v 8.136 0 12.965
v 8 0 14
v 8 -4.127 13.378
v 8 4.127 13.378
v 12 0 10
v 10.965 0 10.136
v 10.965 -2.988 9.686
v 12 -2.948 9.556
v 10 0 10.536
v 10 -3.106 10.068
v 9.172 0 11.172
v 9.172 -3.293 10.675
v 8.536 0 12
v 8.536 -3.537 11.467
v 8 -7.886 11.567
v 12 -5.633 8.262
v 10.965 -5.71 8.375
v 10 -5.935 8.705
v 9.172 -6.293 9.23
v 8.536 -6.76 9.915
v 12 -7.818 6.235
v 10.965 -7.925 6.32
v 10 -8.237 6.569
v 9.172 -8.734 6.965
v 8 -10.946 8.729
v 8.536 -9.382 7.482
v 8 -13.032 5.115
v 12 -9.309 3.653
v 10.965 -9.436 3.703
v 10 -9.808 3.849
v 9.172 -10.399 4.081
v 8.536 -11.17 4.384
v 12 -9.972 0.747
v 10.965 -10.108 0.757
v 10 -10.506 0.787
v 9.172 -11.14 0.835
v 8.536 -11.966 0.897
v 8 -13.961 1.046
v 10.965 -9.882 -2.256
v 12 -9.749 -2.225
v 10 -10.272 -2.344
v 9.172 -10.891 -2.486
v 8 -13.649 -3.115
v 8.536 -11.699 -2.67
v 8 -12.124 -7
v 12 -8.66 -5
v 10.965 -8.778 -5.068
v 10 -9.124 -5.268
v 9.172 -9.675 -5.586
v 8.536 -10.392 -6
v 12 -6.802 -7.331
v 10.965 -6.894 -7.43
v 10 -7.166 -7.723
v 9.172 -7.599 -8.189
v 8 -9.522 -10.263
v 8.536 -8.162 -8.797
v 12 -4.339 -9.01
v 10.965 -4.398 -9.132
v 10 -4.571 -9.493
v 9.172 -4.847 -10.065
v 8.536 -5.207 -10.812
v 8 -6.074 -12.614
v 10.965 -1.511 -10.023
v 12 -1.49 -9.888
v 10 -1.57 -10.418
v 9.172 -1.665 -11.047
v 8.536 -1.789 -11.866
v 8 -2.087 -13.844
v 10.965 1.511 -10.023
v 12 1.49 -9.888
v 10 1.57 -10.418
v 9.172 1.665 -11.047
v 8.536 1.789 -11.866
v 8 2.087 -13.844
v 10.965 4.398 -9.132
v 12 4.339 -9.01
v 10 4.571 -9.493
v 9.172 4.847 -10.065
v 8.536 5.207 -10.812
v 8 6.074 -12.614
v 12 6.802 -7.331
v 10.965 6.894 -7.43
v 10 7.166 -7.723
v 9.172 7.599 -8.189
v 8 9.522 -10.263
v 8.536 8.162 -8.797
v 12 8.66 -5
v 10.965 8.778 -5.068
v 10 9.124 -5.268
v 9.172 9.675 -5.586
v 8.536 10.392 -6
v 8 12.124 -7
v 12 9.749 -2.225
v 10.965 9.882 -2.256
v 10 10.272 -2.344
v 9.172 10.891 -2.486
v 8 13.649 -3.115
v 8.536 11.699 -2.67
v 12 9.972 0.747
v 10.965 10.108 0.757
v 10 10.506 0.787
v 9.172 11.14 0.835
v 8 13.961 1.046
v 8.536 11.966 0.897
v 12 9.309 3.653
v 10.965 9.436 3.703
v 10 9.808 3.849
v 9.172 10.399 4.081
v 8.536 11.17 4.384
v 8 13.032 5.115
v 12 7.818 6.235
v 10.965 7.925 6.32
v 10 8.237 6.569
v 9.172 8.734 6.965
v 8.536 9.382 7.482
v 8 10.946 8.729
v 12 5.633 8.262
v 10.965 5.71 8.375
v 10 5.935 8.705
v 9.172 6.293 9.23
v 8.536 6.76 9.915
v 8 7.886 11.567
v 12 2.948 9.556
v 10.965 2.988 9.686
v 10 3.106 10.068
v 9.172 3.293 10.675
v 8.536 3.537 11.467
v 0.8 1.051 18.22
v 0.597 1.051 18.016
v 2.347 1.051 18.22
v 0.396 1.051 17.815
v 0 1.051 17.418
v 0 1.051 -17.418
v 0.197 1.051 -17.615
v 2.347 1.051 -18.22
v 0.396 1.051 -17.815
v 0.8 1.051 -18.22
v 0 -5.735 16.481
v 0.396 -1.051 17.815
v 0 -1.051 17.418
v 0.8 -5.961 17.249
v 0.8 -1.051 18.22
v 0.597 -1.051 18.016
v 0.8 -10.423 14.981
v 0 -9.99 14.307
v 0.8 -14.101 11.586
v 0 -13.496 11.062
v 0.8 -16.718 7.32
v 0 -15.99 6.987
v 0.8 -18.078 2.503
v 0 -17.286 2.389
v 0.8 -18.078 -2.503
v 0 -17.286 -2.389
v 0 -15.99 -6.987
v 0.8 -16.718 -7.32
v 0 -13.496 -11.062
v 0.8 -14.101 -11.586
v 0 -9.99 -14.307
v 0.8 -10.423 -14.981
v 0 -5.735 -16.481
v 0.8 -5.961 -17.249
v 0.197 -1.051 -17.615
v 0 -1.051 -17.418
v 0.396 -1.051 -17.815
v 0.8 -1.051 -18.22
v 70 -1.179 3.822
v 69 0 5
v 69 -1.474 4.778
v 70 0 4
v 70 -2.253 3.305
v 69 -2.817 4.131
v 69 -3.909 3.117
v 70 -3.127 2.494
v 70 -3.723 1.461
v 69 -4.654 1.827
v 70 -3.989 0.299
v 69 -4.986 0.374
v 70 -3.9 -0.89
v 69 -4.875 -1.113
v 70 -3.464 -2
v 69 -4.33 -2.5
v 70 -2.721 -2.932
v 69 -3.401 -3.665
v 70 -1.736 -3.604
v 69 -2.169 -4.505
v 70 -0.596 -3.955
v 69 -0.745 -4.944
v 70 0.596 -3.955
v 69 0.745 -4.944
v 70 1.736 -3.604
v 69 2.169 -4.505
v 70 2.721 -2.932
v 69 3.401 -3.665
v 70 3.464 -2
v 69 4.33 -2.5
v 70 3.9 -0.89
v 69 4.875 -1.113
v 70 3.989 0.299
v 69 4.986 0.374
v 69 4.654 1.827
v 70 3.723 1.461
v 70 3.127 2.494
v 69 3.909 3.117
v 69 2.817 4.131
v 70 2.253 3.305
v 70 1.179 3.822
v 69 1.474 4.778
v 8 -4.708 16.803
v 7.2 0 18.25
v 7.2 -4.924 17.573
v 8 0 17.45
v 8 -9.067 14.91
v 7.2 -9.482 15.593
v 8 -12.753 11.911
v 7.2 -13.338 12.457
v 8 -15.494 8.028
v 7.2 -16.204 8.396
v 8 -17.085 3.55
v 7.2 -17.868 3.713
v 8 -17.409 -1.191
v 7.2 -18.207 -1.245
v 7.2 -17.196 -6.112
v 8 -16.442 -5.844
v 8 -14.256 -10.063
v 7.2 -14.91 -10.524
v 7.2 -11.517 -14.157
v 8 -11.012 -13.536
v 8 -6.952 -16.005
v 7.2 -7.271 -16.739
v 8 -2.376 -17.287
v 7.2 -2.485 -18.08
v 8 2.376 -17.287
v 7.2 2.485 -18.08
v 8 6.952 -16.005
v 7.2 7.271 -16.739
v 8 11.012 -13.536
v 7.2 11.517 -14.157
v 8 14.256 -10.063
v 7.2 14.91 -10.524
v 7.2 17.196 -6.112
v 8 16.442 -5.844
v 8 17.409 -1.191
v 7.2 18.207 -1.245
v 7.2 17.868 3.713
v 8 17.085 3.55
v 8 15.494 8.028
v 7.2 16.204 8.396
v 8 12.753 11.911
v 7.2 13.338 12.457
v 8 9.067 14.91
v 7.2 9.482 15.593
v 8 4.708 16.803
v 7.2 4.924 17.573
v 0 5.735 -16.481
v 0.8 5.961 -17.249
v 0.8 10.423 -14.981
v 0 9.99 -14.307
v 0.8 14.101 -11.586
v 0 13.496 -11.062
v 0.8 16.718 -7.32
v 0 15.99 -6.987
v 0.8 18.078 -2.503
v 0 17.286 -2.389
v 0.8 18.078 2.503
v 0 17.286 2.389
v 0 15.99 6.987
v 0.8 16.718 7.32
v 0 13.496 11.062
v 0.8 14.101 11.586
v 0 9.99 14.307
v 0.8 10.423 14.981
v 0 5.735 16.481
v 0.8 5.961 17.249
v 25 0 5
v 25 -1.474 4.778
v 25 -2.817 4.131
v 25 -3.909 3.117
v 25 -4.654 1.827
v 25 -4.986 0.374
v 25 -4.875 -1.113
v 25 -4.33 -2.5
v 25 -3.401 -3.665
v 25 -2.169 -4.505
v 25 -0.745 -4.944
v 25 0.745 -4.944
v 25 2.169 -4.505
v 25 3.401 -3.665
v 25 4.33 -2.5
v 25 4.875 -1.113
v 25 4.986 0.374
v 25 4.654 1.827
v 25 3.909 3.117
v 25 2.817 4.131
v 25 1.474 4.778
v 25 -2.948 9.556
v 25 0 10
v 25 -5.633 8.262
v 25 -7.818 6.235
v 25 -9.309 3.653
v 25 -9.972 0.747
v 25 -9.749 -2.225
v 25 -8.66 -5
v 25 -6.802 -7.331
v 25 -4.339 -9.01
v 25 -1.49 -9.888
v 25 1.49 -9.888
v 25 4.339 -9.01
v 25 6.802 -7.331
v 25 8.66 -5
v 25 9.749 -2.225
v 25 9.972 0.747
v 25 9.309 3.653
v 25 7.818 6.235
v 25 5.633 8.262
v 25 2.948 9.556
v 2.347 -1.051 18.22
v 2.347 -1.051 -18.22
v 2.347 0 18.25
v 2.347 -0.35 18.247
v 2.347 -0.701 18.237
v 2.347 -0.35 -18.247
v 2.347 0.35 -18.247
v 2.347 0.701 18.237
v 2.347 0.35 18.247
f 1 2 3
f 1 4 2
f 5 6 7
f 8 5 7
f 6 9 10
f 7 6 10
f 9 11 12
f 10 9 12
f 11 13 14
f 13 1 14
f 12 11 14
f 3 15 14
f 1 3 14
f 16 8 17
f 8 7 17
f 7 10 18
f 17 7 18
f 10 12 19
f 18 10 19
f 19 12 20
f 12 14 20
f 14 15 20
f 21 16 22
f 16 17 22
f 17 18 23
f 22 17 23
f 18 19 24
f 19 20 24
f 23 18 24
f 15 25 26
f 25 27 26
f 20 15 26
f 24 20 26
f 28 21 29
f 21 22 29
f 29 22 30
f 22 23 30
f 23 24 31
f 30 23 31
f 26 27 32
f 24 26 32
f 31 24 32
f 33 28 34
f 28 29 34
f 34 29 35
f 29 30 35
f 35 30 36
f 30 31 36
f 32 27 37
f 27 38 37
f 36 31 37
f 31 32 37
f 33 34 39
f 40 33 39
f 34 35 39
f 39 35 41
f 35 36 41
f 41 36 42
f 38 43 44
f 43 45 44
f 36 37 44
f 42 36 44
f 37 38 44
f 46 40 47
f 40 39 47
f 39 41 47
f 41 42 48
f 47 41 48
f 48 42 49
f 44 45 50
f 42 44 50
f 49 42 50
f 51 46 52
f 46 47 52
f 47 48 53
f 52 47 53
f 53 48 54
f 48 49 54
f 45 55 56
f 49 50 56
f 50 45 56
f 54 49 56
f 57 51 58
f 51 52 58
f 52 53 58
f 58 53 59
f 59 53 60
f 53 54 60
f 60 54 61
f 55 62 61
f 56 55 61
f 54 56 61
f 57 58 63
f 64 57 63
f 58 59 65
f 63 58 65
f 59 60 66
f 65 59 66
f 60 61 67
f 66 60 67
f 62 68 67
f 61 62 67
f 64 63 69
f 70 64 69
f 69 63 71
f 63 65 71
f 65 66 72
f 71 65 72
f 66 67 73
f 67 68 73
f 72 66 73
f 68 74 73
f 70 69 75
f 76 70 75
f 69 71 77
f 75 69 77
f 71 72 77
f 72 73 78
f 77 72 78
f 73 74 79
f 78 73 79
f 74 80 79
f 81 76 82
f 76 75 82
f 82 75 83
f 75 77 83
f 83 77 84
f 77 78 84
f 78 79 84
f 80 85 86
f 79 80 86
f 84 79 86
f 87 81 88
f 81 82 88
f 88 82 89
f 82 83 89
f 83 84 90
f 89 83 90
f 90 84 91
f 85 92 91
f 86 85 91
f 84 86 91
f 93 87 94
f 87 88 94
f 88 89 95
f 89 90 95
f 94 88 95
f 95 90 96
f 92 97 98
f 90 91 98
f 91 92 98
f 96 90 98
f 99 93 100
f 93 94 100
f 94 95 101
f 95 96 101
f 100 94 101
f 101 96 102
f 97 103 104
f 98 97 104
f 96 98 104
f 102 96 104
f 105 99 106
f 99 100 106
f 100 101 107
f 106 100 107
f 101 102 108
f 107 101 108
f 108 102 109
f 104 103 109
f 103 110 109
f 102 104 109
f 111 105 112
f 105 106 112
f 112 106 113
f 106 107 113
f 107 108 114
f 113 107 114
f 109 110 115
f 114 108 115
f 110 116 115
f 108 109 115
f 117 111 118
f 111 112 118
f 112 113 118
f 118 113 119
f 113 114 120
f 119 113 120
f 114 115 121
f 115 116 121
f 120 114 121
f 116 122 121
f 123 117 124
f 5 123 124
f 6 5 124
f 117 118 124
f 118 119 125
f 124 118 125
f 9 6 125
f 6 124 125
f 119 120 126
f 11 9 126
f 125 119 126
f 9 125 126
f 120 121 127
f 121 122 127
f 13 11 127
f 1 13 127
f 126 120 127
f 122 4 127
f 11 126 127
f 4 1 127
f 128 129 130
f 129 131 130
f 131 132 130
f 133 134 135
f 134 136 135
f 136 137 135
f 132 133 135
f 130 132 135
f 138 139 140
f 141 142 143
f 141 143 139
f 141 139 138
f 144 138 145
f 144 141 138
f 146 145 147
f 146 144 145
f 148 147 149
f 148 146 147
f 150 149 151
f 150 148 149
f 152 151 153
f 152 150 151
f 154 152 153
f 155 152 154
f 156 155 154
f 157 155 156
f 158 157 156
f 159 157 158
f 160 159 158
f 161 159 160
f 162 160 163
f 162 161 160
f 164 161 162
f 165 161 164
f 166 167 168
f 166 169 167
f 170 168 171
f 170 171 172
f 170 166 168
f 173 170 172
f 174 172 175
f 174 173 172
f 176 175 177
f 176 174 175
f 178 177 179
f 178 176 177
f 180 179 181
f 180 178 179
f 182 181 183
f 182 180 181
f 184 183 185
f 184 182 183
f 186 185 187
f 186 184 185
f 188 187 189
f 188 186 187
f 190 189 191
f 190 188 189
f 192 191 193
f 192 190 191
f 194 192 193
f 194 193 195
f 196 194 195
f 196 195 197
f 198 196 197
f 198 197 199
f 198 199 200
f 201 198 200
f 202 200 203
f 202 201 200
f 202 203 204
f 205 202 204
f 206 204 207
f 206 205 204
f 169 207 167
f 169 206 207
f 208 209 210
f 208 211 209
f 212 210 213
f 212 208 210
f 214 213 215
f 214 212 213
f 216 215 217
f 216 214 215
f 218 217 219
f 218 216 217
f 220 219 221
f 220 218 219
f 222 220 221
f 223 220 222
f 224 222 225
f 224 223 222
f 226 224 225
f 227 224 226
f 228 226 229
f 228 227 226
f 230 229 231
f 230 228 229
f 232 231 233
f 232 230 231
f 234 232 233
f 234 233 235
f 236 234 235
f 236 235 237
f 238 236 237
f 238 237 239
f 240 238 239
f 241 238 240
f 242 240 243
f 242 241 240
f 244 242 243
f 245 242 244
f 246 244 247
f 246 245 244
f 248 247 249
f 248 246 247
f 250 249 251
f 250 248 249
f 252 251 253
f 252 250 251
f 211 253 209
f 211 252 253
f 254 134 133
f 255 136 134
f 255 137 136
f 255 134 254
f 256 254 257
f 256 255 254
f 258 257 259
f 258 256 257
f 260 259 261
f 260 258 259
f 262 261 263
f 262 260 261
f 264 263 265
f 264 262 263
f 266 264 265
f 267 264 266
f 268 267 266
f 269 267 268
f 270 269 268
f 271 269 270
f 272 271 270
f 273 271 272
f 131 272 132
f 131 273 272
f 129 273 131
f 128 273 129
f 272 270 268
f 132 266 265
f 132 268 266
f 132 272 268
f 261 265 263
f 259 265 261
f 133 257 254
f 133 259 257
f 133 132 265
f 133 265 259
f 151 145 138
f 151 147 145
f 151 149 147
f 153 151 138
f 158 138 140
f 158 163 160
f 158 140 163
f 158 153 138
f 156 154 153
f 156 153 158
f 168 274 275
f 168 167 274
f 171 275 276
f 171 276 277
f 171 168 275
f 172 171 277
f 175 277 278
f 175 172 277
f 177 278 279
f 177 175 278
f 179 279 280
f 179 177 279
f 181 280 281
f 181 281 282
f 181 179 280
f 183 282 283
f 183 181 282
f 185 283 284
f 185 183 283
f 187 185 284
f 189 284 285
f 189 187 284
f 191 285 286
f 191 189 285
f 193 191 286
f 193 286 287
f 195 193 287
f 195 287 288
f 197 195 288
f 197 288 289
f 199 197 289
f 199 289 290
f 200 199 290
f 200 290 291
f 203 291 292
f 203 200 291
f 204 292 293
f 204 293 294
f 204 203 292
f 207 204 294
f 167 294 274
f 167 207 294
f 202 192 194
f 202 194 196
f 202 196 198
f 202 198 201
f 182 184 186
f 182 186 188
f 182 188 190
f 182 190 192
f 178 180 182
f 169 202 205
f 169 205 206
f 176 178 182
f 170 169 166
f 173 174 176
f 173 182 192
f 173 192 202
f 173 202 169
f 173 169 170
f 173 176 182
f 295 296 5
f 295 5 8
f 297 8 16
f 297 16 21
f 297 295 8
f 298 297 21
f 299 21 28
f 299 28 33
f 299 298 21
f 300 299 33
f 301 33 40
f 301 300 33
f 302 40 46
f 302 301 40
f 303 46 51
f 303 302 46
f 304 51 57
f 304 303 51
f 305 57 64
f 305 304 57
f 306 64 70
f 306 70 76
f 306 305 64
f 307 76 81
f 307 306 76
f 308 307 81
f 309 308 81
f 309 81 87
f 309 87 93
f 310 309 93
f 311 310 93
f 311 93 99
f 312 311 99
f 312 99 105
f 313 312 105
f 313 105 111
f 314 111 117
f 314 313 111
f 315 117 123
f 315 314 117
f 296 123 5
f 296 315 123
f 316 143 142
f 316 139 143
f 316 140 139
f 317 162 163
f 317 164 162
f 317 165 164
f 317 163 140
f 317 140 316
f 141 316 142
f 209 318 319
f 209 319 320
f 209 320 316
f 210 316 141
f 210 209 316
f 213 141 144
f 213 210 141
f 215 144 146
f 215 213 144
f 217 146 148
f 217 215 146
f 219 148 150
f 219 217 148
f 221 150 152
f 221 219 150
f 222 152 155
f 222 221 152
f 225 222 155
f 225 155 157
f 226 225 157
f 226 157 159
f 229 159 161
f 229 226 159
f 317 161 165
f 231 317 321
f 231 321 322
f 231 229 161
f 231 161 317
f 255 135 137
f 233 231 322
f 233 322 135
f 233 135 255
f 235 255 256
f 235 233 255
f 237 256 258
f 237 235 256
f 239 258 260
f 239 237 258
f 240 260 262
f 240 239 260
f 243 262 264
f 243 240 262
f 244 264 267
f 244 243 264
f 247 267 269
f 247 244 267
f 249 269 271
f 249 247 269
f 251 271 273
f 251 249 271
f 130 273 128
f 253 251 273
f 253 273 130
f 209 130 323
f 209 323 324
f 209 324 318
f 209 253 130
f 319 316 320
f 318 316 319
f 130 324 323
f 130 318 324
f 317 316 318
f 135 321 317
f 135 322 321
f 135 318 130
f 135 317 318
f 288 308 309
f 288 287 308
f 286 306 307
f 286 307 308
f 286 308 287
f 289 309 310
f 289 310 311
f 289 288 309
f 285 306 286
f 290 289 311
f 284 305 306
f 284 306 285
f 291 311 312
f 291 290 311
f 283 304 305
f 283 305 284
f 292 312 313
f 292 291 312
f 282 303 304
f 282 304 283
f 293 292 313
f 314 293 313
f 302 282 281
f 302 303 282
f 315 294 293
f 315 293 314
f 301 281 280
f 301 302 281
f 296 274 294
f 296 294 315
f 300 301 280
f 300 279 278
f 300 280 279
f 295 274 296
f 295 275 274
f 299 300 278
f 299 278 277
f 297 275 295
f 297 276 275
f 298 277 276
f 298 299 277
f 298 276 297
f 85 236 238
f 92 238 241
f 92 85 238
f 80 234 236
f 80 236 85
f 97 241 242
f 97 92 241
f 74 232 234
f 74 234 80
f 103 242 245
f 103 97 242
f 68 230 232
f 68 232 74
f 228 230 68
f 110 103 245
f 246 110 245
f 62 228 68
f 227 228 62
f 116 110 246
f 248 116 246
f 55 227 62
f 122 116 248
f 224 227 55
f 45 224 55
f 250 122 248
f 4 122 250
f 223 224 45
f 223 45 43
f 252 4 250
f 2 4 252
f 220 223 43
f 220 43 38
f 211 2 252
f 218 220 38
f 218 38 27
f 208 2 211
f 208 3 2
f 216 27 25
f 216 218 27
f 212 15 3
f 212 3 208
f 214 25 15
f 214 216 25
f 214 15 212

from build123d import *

# Parameters (mm, degrees)
SLOT_DEPTH      = 75.606467548
SLOT_DEPTH_BACK = 75.606467548
SLOTSKE_W       = 4.69310445
SLOTSKE_H       = 2.101390052
FILLET1_R       = 4


with BuildPart() as part:
    # BodySke → Base-Revolve (revolve)
    with BuildSketch(Plane.XY, mode=Mode.PRIVATE) as base_revolve_sk:
        Polygon((69, 5), (70, 4), (70, 0), (0, 0), (0, 17.45), (0.8, 18.25), (7.2, 18.25), (8, 17.45), (8, 10), (25, 10), (25, 5), align=None)
    revolve(base_revolve_sk.sketch.rotate(Axis((-25.4, 0, 0), (1, 0, 0)), 90), axis=Axis((-25.4, 0, 0), (1, 0, 0)))

    # SlotSke → Slot (cut, two sides: drawn at the far end of the back side and taken through both)
    with BuildSketch(Plane.XY.offset(-SLOT_DEPTH_BACK)):
        Rectangle(SLOTSKE_W, SLOTSKE_H)
    extrude(amount=SLOT_DEPTH + SLOT_DEPTH_BACK, mode=Mode.SUBTRACT)

    # Fillet1
    fillet1_edges = [part.edges().sort_by_distance(p)[0] for p in [
        (8, 0, -10),
    ]]
    fillet(fillet1_edges, radius=FILLET1_R)


solid = part.part
